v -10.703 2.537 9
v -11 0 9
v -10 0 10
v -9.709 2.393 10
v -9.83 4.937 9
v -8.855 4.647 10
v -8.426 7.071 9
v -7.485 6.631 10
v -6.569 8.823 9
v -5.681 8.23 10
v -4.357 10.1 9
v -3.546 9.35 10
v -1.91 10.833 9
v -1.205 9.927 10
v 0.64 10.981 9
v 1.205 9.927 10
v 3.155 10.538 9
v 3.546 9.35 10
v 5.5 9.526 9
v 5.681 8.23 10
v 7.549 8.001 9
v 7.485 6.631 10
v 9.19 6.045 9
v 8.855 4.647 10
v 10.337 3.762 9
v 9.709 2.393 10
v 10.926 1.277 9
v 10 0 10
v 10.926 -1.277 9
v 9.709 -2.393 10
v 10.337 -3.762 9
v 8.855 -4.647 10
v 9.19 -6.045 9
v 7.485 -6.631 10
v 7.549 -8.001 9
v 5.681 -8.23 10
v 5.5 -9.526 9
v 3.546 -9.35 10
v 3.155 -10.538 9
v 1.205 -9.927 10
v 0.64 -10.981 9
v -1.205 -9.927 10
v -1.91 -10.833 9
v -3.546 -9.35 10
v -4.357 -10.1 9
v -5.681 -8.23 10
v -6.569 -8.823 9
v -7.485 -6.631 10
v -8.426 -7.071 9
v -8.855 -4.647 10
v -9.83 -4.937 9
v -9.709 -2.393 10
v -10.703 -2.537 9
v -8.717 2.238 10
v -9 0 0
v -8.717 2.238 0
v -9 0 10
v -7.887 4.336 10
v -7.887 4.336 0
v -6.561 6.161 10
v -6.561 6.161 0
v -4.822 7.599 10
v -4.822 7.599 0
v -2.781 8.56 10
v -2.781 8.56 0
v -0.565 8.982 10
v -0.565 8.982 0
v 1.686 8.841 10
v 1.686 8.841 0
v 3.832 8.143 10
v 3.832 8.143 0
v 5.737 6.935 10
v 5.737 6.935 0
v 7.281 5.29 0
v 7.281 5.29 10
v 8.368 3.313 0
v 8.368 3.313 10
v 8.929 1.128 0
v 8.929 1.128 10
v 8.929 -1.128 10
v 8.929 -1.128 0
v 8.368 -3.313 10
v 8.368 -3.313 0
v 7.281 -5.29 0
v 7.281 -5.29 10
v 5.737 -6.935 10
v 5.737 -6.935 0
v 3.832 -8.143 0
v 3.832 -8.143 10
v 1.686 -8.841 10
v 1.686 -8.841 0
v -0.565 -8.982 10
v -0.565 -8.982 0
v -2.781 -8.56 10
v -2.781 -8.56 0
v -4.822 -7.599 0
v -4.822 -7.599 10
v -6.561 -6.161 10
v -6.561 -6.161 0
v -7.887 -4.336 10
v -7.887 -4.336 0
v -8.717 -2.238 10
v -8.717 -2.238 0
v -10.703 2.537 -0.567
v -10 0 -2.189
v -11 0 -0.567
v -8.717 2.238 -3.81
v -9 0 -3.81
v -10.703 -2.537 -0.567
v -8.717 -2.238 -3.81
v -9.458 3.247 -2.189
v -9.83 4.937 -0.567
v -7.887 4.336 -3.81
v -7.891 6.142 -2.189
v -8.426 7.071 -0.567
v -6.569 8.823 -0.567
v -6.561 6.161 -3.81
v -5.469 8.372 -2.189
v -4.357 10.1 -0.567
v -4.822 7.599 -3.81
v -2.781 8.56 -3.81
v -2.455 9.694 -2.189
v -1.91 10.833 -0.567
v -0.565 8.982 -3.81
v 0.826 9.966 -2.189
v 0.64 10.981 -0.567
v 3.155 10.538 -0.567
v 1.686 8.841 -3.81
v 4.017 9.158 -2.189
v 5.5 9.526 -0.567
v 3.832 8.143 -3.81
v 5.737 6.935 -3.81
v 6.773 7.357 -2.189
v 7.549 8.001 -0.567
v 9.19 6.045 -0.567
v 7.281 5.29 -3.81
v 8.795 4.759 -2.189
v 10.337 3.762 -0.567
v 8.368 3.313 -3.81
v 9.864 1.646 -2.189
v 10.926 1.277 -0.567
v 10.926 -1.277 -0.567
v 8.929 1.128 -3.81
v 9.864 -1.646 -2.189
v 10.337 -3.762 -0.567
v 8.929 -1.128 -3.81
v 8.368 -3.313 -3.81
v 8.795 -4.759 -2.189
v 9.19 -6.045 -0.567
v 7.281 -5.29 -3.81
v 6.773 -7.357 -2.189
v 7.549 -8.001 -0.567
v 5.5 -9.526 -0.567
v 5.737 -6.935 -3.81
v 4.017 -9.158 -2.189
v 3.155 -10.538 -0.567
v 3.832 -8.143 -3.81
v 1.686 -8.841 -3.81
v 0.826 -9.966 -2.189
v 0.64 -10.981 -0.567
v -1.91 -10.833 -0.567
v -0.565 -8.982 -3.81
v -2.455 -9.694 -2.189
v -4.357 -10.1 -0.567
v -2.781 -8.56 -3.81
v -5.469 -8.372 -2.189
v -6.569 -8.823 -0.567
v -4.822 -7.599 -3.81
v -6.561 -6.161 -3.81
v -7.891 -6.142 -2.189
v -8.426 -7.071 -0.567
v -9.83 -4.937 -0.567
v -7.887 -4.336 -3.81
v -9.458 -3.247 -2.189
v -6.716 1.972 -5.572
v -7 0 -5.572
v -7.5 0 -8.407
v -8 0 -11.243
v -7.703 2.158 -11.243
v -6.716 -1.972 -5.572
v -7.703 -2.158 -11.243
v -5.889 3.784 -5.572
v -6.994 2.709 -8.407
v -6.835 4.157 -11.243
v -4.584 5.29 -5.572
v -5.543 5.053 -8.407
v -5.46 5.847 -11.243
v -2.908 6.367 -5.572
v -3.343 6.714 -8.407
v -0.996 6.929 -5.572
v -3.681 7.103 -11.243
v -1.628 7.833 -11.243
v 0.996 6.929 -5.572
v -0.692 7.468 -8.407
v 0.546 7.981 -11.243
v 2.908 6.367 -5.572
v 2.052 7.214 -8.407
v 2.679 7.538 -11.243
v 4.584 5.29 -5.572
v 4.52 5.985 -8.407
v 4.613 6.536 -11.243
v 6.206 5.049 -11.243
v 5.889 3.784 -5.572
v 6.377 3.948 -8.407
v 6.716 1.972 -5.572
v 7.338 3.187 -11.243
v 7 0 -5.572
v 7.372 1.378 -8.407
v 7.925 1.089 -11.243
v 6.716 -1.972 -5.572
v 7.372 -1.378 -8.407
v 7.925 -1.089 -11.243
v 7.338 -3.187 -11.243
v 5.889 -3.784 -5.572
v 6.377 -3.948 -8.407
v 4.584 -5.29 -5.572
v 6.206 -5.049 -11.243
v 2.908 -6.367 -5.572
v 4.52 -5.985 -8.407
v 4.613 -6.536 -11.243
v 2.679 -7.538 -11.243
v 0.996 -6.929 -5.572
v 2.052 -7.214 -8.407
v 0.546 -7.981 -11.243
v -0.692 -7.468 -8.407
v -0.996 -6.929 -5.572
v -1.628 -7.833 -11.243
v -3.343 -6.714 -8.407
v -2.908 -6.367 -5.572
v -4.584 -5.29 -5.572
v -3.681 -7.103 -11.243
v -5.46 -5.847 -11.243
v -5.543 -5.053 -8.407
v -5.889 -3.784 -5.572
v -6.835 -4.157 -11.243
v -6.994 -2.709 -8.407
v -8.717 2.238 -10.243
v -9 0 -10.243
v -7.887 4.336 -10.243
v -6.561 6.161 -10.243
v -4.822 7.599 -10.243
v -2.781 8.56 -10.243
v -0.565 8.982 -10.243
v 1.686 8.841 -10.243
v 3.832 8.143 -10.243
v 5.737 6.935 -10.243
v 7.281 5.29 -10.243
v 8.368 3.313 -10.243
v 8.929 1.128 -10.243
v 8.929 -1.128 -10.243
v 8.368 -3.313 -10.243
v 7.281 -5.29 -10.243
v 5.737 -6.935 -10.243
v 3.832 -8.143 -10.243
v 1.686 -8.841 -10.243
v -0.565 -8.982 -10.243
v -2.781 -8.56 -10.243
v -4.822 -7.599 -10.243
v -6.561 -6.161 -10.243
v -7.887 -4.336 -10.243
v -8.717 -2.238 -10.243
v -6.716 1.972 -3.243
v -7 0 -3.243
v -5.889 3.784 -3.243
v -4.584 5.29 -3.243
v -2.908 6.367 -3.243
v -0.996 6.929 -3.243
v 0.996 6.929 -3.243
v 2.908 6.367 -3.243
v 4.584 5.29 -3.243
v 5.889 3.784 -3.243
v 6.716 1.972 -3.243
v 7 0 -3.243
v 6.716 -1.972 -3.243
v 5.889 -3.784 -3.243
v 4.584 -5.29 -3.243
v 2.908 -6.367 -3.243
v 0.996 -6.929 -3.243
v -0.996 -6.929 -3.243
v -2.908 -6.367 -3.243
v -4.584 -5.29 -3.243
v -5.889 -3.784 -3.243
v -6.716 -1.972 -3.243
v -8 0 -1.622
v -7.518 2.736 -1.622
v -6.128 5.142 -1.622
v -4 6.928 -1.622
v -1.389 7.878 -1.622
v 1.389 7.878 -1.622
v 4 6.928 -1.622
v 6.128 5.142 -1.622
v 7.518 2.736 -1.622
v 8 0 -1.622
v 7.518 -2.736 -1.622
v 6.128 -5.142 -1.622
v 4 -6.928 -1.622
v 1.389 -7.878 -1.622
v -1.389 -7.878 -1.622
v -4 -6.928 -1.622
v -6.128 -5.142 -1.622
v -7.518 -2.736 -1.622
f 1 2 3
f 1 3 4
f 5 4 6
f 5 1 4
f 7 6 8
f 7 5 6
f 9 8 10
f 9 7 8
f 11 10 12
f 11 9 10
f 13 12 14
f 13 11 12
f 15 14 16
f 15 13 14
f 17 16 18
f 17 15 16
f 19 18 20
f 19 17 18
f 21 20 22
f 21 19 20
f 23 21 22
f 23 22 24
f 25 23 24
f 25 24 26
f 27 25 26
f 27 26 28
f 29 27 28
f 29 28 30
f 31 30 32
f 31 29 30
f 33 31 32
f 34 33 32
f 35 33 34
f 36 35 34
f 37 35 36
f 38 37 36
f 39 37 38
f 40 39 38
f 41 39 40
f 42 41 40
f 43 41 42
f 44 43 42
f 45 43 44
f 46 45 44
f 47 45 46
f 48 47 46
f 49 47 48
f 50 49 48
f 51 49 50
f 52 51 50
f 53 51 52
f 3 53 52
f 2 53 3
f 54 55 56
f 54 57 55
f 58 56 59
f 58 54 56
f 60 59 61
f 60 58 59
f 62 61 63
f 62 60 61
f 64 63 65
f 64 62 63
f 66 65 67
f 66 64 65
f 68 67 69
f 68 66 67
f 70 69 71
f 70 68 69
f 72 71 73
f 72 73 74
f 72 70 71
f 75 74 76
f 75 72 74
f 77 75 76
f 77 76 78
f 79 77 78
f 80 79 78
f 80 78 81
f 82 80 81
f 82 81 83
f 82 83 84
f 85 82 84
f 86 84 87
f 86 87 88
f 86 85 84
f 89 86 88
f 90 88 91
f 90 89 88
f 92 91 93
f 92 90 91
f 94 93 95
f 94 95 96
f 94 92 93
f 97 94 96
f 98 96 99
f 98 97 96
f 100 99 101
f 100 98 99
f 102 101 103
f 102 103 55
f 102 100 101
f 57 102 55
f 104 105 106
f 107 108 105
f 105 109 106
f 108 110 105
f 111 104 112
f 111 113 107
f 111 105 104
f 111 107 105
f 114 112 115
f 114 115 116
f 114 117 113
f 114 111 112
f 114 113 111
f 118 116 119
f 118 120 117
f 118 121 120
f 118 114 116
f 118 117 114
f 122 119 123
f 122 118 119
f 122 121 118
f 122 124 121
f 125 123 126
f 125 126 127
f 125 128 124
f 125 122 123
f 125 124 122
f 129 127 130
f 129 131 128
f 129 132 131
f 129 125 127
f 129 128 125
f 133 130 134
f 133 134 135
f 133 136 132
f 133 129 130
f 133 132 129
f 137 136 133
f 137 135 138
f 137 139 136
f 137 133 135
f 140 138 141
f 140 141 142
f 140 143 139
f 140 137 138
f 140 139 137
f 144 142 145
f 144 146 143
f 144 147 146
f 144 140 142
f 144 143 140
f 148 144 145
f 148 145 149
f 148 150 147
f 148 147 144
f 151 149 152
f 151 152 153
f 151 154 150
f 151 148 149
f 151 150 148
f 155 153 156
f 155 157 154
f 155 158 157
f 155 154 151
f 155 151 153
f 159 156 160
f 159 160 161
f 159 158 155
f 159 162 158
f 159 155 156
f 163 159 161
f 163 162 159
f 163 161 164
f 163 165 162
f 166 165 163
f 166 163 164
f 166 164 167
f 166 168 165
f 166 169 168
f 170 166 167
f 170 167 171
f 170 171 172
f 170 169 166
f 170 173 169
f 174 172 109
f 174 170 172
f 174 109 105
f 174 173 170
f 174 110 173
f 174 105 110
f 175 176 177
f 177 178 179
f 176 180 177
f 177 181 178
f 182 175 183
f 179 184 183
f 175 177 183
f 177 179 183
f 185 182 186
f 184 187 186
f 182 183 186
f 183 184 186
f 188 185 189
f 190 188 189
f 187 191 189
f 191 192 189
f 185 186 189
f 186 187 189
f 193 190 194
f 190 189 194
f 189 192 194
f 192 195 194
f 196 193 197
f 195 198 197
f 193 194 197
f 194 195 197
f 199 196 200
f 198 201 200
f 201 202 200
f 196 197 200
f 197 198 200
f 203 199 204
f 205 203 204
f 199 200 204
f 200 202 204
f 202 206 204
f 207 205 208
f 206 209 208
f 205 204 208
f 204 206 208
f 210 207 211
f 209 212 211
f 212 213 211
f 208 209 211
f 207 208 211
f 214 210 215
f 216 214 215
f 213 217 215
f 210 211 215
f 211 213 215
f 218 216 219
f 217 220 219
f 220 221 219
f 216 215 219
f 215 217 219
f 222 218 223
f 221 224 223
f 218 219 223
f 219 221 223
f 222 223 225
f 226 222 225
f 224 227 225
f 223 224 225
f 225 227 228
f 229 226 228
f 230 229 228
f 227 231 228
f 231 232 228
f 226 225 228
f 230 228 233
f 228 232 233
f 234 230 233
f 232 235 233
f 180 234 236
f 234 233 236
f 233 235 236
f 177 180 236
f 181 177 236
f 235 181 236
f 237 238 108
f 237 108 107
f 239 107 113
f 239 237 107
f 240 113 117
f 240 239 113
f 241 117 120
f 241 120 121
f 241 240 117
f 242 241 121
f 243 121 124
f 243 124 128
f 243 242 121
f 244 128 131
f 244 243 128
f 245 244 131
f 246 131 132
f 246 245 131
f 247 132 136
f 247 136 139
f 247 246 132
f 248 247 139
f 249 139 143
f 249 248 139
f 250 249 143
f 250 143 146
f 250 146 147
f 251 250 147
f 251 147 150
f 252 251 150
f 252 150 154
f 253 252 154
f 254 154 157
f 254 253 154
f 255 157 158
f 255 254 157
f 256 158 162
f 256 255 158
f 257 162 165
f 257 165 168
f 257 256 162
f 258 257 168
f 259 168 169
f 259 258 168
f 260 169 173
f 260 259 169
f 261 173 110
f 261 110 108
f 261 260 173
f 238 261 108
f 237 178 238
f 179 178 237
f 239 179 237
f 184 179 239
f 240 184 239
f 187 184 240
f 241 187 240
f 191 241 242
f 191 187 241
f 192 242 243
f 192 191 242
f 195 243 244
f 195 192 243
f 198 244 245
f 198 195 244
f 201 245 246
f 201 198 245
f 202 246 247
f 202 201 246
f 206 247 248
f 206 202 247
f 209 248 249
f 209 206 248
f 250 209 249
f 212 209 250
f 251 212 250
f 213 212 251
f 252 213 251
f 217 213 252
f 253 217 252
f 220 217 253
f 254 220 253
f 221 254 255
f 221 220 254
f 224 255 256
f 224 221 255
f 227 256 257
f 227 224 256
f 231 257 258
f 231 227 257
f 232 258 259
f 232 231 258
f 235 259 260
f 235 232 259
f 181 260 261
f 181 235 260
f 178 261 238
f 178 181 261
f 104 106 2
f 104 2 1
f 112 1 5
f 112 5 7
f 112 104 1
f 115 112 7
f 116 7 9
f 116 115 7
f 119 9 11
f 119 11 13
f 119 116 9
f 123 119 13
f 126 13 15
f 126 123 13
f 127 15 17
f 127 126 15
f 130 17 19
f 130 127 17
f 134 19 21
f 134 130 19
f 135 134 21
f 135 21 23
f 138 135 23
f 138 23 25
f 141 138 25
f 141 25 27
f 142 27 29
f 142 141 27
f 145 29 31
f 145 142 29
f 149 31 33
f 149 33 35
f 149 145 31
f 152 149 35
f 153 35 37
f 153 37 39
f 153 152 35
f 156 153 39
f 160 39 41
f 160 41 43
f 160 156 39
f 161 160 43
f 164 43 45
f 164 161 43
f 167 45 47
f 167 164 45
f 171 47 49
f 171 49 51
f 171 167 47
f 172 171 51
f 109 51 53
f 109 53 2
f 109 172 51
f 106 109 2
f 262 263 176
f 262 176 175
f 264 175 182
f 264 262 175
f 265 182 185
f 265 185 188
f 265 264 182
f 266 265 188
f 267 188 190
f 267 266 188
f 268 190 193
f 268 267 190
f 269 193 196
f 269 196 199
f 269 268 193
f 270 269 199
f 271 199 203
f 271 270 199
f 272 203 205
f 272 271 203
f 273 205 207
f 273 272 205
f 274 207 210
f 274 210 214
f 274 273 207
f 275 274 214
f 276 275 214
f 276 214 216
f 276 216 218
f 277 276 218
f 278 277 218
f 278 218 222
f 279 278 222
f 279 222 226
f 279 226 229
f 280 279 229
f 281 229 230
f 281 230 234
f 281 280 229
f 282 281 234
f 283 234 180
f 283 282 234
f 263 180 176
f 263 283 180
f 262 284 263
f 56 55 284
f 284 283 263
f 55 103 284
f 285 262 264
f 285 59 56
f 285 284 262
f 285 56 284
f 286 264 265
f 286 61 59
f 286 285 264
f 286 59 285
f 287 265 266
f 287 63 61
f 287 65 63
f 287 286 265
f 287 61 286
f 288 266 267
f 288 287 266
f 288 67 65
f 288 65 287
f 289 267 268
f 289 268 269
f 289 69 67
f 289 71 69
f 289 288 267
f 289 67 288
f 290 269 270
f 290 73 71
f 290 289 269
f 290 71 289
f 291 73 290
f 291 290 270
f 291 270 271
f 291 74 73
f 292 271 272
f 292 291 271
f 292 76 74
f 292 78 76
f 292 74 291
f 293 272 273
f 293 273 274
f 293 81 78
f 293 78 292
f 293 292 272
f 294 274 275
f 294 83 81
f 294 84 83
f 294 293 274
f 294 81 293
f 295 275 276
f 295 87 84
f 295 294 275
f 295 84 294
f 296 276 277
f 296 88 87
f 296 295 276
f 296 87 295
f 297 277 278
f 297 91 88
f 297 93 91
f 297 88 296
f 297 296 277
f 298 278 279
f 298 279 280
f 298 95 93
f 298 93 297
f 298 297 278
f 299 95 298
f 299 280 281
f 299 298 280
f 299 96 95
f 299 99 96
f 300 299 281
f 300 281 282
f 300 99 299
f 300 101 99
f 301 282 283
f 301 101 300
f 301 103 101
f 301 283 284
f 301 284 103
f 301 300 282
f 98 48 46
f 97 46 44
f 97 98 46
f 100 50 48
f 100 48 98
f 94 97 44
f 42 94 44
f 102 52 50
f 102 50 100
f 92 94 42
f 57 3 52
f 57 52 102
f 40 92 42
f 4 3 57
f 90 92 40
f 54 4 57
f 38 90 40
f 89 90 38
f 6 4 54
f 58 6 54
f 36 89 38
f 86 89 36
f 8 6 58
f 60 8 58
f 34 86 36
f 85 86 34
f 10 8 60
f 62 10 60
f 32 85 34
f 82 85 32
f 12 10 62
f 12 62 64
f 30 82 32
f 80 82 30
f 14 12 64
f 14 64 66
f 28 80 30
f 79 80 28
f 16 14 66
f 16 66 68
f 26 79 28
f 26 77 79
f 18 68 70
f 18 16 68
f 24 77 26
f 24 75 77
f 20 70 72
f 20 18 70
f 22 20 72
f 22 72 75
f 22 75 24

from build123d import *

# Parameters (mm, degrees)
F2_SIZE2 = 1
F2_SIZE  = 1
F3_SIZE2 = 0.99999
F3_SIZE  = 5.671272


# Not quite as in the source:
# - a fillet or chamfer is up to 0.001 mm smaller than in the source, because OpenCascade refuses the exact size


with BuildPart() as f1:
    # F0 (on Front) → F1 (revolve)
    with BuildSketch(Plane.XZ):
        Polygon((-9, 0), (-9, 10), (-11, 10), (-11, -0.5671153529), (-9, -3.8101770668), (-9, -11.2430617139), (-7, -11.2430617139), (-7, -3.2430617139), align=None)
    revolve(axis=Axis((0, 0, -1.2268370084), (0, 0, -1)))

    # F2
    f2_edges = [f1.edges().sort_by_distance(p)[0] for p in [
        (9, 0, -11.243062),
        (11, 0, 10),
    ]]
    chamfer(f2_edges, length=F2_SIZE, length2=F2_SIZE2)

    # F3 (size 5.6712818196 and 1 in the source; OpenCascade refuses exactly that, so slightly less here)
    f3_edges = [f1.edges().sort_by_distance(p)[0] for p in [
        (7, 0, -11.243062),
    ]]
    f3_side = f1.faces().sort_by_distance((7, 0, -7.243062))[0]
    chamfer(f3_edges, length=F3_SIZE, length2=F3_SIZE2, reference=f3_side)


solid = f1.part
